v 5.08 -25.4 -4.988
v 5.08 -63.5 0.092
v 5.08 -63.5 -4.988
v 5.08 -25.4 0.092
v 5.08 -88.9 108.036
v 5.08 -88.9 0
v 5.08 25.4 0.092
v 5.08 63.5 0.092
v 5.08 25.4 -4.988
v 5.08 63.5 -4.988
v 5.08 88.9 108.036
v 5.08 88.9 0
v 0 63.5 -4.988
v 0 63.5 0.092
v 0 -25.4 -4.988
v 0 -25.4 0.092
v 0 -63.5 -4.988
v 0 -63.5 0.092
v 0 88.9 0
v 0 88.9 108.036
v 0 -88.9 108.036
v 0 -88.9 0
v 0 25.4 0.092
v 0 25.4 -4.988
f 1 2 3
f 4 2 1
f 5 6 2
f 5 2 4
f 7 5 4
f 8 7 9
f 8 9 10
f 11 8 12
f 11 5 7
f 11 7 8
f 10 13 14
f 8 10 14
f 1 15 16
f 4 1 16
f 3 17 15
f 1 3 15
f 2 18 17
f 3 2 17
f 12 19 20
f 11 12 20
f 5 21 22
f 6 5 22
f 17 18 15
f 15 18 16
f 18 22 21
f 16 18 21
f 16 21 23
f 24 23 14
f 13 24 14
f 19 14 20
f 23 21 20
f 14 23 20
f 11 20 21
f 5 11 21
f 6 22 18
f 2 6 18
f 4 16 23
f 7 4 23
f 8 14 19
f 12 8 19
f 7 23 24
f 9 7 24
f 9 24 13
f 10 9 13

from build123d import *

# Parameters (mm, degrees)
F1_DEPTH = 5.08


with BuildPart() as f1:
    # F0 (on Right) → F1 (new body)
    with BuildSketch(Plane.YZ):
        Polygon((-25.4, 0.091885), (0, 0.091885), (25.4, 0.091885), (25.4, -4.988115), (63.5, -4.988115), (63.5, 0.091885), (88.9, 0), (88.9, 6.436423), (88.9, 108.036423), (-88.9, 108.036423), (-88.9, 6.436423), (-88.9, 0), (-63.5, 0.091885), (-63.5, -4.988115), (-25.4, -4.988115), align=None)
    extrude(amount=F1_DEPTH)


solid = f1.part
